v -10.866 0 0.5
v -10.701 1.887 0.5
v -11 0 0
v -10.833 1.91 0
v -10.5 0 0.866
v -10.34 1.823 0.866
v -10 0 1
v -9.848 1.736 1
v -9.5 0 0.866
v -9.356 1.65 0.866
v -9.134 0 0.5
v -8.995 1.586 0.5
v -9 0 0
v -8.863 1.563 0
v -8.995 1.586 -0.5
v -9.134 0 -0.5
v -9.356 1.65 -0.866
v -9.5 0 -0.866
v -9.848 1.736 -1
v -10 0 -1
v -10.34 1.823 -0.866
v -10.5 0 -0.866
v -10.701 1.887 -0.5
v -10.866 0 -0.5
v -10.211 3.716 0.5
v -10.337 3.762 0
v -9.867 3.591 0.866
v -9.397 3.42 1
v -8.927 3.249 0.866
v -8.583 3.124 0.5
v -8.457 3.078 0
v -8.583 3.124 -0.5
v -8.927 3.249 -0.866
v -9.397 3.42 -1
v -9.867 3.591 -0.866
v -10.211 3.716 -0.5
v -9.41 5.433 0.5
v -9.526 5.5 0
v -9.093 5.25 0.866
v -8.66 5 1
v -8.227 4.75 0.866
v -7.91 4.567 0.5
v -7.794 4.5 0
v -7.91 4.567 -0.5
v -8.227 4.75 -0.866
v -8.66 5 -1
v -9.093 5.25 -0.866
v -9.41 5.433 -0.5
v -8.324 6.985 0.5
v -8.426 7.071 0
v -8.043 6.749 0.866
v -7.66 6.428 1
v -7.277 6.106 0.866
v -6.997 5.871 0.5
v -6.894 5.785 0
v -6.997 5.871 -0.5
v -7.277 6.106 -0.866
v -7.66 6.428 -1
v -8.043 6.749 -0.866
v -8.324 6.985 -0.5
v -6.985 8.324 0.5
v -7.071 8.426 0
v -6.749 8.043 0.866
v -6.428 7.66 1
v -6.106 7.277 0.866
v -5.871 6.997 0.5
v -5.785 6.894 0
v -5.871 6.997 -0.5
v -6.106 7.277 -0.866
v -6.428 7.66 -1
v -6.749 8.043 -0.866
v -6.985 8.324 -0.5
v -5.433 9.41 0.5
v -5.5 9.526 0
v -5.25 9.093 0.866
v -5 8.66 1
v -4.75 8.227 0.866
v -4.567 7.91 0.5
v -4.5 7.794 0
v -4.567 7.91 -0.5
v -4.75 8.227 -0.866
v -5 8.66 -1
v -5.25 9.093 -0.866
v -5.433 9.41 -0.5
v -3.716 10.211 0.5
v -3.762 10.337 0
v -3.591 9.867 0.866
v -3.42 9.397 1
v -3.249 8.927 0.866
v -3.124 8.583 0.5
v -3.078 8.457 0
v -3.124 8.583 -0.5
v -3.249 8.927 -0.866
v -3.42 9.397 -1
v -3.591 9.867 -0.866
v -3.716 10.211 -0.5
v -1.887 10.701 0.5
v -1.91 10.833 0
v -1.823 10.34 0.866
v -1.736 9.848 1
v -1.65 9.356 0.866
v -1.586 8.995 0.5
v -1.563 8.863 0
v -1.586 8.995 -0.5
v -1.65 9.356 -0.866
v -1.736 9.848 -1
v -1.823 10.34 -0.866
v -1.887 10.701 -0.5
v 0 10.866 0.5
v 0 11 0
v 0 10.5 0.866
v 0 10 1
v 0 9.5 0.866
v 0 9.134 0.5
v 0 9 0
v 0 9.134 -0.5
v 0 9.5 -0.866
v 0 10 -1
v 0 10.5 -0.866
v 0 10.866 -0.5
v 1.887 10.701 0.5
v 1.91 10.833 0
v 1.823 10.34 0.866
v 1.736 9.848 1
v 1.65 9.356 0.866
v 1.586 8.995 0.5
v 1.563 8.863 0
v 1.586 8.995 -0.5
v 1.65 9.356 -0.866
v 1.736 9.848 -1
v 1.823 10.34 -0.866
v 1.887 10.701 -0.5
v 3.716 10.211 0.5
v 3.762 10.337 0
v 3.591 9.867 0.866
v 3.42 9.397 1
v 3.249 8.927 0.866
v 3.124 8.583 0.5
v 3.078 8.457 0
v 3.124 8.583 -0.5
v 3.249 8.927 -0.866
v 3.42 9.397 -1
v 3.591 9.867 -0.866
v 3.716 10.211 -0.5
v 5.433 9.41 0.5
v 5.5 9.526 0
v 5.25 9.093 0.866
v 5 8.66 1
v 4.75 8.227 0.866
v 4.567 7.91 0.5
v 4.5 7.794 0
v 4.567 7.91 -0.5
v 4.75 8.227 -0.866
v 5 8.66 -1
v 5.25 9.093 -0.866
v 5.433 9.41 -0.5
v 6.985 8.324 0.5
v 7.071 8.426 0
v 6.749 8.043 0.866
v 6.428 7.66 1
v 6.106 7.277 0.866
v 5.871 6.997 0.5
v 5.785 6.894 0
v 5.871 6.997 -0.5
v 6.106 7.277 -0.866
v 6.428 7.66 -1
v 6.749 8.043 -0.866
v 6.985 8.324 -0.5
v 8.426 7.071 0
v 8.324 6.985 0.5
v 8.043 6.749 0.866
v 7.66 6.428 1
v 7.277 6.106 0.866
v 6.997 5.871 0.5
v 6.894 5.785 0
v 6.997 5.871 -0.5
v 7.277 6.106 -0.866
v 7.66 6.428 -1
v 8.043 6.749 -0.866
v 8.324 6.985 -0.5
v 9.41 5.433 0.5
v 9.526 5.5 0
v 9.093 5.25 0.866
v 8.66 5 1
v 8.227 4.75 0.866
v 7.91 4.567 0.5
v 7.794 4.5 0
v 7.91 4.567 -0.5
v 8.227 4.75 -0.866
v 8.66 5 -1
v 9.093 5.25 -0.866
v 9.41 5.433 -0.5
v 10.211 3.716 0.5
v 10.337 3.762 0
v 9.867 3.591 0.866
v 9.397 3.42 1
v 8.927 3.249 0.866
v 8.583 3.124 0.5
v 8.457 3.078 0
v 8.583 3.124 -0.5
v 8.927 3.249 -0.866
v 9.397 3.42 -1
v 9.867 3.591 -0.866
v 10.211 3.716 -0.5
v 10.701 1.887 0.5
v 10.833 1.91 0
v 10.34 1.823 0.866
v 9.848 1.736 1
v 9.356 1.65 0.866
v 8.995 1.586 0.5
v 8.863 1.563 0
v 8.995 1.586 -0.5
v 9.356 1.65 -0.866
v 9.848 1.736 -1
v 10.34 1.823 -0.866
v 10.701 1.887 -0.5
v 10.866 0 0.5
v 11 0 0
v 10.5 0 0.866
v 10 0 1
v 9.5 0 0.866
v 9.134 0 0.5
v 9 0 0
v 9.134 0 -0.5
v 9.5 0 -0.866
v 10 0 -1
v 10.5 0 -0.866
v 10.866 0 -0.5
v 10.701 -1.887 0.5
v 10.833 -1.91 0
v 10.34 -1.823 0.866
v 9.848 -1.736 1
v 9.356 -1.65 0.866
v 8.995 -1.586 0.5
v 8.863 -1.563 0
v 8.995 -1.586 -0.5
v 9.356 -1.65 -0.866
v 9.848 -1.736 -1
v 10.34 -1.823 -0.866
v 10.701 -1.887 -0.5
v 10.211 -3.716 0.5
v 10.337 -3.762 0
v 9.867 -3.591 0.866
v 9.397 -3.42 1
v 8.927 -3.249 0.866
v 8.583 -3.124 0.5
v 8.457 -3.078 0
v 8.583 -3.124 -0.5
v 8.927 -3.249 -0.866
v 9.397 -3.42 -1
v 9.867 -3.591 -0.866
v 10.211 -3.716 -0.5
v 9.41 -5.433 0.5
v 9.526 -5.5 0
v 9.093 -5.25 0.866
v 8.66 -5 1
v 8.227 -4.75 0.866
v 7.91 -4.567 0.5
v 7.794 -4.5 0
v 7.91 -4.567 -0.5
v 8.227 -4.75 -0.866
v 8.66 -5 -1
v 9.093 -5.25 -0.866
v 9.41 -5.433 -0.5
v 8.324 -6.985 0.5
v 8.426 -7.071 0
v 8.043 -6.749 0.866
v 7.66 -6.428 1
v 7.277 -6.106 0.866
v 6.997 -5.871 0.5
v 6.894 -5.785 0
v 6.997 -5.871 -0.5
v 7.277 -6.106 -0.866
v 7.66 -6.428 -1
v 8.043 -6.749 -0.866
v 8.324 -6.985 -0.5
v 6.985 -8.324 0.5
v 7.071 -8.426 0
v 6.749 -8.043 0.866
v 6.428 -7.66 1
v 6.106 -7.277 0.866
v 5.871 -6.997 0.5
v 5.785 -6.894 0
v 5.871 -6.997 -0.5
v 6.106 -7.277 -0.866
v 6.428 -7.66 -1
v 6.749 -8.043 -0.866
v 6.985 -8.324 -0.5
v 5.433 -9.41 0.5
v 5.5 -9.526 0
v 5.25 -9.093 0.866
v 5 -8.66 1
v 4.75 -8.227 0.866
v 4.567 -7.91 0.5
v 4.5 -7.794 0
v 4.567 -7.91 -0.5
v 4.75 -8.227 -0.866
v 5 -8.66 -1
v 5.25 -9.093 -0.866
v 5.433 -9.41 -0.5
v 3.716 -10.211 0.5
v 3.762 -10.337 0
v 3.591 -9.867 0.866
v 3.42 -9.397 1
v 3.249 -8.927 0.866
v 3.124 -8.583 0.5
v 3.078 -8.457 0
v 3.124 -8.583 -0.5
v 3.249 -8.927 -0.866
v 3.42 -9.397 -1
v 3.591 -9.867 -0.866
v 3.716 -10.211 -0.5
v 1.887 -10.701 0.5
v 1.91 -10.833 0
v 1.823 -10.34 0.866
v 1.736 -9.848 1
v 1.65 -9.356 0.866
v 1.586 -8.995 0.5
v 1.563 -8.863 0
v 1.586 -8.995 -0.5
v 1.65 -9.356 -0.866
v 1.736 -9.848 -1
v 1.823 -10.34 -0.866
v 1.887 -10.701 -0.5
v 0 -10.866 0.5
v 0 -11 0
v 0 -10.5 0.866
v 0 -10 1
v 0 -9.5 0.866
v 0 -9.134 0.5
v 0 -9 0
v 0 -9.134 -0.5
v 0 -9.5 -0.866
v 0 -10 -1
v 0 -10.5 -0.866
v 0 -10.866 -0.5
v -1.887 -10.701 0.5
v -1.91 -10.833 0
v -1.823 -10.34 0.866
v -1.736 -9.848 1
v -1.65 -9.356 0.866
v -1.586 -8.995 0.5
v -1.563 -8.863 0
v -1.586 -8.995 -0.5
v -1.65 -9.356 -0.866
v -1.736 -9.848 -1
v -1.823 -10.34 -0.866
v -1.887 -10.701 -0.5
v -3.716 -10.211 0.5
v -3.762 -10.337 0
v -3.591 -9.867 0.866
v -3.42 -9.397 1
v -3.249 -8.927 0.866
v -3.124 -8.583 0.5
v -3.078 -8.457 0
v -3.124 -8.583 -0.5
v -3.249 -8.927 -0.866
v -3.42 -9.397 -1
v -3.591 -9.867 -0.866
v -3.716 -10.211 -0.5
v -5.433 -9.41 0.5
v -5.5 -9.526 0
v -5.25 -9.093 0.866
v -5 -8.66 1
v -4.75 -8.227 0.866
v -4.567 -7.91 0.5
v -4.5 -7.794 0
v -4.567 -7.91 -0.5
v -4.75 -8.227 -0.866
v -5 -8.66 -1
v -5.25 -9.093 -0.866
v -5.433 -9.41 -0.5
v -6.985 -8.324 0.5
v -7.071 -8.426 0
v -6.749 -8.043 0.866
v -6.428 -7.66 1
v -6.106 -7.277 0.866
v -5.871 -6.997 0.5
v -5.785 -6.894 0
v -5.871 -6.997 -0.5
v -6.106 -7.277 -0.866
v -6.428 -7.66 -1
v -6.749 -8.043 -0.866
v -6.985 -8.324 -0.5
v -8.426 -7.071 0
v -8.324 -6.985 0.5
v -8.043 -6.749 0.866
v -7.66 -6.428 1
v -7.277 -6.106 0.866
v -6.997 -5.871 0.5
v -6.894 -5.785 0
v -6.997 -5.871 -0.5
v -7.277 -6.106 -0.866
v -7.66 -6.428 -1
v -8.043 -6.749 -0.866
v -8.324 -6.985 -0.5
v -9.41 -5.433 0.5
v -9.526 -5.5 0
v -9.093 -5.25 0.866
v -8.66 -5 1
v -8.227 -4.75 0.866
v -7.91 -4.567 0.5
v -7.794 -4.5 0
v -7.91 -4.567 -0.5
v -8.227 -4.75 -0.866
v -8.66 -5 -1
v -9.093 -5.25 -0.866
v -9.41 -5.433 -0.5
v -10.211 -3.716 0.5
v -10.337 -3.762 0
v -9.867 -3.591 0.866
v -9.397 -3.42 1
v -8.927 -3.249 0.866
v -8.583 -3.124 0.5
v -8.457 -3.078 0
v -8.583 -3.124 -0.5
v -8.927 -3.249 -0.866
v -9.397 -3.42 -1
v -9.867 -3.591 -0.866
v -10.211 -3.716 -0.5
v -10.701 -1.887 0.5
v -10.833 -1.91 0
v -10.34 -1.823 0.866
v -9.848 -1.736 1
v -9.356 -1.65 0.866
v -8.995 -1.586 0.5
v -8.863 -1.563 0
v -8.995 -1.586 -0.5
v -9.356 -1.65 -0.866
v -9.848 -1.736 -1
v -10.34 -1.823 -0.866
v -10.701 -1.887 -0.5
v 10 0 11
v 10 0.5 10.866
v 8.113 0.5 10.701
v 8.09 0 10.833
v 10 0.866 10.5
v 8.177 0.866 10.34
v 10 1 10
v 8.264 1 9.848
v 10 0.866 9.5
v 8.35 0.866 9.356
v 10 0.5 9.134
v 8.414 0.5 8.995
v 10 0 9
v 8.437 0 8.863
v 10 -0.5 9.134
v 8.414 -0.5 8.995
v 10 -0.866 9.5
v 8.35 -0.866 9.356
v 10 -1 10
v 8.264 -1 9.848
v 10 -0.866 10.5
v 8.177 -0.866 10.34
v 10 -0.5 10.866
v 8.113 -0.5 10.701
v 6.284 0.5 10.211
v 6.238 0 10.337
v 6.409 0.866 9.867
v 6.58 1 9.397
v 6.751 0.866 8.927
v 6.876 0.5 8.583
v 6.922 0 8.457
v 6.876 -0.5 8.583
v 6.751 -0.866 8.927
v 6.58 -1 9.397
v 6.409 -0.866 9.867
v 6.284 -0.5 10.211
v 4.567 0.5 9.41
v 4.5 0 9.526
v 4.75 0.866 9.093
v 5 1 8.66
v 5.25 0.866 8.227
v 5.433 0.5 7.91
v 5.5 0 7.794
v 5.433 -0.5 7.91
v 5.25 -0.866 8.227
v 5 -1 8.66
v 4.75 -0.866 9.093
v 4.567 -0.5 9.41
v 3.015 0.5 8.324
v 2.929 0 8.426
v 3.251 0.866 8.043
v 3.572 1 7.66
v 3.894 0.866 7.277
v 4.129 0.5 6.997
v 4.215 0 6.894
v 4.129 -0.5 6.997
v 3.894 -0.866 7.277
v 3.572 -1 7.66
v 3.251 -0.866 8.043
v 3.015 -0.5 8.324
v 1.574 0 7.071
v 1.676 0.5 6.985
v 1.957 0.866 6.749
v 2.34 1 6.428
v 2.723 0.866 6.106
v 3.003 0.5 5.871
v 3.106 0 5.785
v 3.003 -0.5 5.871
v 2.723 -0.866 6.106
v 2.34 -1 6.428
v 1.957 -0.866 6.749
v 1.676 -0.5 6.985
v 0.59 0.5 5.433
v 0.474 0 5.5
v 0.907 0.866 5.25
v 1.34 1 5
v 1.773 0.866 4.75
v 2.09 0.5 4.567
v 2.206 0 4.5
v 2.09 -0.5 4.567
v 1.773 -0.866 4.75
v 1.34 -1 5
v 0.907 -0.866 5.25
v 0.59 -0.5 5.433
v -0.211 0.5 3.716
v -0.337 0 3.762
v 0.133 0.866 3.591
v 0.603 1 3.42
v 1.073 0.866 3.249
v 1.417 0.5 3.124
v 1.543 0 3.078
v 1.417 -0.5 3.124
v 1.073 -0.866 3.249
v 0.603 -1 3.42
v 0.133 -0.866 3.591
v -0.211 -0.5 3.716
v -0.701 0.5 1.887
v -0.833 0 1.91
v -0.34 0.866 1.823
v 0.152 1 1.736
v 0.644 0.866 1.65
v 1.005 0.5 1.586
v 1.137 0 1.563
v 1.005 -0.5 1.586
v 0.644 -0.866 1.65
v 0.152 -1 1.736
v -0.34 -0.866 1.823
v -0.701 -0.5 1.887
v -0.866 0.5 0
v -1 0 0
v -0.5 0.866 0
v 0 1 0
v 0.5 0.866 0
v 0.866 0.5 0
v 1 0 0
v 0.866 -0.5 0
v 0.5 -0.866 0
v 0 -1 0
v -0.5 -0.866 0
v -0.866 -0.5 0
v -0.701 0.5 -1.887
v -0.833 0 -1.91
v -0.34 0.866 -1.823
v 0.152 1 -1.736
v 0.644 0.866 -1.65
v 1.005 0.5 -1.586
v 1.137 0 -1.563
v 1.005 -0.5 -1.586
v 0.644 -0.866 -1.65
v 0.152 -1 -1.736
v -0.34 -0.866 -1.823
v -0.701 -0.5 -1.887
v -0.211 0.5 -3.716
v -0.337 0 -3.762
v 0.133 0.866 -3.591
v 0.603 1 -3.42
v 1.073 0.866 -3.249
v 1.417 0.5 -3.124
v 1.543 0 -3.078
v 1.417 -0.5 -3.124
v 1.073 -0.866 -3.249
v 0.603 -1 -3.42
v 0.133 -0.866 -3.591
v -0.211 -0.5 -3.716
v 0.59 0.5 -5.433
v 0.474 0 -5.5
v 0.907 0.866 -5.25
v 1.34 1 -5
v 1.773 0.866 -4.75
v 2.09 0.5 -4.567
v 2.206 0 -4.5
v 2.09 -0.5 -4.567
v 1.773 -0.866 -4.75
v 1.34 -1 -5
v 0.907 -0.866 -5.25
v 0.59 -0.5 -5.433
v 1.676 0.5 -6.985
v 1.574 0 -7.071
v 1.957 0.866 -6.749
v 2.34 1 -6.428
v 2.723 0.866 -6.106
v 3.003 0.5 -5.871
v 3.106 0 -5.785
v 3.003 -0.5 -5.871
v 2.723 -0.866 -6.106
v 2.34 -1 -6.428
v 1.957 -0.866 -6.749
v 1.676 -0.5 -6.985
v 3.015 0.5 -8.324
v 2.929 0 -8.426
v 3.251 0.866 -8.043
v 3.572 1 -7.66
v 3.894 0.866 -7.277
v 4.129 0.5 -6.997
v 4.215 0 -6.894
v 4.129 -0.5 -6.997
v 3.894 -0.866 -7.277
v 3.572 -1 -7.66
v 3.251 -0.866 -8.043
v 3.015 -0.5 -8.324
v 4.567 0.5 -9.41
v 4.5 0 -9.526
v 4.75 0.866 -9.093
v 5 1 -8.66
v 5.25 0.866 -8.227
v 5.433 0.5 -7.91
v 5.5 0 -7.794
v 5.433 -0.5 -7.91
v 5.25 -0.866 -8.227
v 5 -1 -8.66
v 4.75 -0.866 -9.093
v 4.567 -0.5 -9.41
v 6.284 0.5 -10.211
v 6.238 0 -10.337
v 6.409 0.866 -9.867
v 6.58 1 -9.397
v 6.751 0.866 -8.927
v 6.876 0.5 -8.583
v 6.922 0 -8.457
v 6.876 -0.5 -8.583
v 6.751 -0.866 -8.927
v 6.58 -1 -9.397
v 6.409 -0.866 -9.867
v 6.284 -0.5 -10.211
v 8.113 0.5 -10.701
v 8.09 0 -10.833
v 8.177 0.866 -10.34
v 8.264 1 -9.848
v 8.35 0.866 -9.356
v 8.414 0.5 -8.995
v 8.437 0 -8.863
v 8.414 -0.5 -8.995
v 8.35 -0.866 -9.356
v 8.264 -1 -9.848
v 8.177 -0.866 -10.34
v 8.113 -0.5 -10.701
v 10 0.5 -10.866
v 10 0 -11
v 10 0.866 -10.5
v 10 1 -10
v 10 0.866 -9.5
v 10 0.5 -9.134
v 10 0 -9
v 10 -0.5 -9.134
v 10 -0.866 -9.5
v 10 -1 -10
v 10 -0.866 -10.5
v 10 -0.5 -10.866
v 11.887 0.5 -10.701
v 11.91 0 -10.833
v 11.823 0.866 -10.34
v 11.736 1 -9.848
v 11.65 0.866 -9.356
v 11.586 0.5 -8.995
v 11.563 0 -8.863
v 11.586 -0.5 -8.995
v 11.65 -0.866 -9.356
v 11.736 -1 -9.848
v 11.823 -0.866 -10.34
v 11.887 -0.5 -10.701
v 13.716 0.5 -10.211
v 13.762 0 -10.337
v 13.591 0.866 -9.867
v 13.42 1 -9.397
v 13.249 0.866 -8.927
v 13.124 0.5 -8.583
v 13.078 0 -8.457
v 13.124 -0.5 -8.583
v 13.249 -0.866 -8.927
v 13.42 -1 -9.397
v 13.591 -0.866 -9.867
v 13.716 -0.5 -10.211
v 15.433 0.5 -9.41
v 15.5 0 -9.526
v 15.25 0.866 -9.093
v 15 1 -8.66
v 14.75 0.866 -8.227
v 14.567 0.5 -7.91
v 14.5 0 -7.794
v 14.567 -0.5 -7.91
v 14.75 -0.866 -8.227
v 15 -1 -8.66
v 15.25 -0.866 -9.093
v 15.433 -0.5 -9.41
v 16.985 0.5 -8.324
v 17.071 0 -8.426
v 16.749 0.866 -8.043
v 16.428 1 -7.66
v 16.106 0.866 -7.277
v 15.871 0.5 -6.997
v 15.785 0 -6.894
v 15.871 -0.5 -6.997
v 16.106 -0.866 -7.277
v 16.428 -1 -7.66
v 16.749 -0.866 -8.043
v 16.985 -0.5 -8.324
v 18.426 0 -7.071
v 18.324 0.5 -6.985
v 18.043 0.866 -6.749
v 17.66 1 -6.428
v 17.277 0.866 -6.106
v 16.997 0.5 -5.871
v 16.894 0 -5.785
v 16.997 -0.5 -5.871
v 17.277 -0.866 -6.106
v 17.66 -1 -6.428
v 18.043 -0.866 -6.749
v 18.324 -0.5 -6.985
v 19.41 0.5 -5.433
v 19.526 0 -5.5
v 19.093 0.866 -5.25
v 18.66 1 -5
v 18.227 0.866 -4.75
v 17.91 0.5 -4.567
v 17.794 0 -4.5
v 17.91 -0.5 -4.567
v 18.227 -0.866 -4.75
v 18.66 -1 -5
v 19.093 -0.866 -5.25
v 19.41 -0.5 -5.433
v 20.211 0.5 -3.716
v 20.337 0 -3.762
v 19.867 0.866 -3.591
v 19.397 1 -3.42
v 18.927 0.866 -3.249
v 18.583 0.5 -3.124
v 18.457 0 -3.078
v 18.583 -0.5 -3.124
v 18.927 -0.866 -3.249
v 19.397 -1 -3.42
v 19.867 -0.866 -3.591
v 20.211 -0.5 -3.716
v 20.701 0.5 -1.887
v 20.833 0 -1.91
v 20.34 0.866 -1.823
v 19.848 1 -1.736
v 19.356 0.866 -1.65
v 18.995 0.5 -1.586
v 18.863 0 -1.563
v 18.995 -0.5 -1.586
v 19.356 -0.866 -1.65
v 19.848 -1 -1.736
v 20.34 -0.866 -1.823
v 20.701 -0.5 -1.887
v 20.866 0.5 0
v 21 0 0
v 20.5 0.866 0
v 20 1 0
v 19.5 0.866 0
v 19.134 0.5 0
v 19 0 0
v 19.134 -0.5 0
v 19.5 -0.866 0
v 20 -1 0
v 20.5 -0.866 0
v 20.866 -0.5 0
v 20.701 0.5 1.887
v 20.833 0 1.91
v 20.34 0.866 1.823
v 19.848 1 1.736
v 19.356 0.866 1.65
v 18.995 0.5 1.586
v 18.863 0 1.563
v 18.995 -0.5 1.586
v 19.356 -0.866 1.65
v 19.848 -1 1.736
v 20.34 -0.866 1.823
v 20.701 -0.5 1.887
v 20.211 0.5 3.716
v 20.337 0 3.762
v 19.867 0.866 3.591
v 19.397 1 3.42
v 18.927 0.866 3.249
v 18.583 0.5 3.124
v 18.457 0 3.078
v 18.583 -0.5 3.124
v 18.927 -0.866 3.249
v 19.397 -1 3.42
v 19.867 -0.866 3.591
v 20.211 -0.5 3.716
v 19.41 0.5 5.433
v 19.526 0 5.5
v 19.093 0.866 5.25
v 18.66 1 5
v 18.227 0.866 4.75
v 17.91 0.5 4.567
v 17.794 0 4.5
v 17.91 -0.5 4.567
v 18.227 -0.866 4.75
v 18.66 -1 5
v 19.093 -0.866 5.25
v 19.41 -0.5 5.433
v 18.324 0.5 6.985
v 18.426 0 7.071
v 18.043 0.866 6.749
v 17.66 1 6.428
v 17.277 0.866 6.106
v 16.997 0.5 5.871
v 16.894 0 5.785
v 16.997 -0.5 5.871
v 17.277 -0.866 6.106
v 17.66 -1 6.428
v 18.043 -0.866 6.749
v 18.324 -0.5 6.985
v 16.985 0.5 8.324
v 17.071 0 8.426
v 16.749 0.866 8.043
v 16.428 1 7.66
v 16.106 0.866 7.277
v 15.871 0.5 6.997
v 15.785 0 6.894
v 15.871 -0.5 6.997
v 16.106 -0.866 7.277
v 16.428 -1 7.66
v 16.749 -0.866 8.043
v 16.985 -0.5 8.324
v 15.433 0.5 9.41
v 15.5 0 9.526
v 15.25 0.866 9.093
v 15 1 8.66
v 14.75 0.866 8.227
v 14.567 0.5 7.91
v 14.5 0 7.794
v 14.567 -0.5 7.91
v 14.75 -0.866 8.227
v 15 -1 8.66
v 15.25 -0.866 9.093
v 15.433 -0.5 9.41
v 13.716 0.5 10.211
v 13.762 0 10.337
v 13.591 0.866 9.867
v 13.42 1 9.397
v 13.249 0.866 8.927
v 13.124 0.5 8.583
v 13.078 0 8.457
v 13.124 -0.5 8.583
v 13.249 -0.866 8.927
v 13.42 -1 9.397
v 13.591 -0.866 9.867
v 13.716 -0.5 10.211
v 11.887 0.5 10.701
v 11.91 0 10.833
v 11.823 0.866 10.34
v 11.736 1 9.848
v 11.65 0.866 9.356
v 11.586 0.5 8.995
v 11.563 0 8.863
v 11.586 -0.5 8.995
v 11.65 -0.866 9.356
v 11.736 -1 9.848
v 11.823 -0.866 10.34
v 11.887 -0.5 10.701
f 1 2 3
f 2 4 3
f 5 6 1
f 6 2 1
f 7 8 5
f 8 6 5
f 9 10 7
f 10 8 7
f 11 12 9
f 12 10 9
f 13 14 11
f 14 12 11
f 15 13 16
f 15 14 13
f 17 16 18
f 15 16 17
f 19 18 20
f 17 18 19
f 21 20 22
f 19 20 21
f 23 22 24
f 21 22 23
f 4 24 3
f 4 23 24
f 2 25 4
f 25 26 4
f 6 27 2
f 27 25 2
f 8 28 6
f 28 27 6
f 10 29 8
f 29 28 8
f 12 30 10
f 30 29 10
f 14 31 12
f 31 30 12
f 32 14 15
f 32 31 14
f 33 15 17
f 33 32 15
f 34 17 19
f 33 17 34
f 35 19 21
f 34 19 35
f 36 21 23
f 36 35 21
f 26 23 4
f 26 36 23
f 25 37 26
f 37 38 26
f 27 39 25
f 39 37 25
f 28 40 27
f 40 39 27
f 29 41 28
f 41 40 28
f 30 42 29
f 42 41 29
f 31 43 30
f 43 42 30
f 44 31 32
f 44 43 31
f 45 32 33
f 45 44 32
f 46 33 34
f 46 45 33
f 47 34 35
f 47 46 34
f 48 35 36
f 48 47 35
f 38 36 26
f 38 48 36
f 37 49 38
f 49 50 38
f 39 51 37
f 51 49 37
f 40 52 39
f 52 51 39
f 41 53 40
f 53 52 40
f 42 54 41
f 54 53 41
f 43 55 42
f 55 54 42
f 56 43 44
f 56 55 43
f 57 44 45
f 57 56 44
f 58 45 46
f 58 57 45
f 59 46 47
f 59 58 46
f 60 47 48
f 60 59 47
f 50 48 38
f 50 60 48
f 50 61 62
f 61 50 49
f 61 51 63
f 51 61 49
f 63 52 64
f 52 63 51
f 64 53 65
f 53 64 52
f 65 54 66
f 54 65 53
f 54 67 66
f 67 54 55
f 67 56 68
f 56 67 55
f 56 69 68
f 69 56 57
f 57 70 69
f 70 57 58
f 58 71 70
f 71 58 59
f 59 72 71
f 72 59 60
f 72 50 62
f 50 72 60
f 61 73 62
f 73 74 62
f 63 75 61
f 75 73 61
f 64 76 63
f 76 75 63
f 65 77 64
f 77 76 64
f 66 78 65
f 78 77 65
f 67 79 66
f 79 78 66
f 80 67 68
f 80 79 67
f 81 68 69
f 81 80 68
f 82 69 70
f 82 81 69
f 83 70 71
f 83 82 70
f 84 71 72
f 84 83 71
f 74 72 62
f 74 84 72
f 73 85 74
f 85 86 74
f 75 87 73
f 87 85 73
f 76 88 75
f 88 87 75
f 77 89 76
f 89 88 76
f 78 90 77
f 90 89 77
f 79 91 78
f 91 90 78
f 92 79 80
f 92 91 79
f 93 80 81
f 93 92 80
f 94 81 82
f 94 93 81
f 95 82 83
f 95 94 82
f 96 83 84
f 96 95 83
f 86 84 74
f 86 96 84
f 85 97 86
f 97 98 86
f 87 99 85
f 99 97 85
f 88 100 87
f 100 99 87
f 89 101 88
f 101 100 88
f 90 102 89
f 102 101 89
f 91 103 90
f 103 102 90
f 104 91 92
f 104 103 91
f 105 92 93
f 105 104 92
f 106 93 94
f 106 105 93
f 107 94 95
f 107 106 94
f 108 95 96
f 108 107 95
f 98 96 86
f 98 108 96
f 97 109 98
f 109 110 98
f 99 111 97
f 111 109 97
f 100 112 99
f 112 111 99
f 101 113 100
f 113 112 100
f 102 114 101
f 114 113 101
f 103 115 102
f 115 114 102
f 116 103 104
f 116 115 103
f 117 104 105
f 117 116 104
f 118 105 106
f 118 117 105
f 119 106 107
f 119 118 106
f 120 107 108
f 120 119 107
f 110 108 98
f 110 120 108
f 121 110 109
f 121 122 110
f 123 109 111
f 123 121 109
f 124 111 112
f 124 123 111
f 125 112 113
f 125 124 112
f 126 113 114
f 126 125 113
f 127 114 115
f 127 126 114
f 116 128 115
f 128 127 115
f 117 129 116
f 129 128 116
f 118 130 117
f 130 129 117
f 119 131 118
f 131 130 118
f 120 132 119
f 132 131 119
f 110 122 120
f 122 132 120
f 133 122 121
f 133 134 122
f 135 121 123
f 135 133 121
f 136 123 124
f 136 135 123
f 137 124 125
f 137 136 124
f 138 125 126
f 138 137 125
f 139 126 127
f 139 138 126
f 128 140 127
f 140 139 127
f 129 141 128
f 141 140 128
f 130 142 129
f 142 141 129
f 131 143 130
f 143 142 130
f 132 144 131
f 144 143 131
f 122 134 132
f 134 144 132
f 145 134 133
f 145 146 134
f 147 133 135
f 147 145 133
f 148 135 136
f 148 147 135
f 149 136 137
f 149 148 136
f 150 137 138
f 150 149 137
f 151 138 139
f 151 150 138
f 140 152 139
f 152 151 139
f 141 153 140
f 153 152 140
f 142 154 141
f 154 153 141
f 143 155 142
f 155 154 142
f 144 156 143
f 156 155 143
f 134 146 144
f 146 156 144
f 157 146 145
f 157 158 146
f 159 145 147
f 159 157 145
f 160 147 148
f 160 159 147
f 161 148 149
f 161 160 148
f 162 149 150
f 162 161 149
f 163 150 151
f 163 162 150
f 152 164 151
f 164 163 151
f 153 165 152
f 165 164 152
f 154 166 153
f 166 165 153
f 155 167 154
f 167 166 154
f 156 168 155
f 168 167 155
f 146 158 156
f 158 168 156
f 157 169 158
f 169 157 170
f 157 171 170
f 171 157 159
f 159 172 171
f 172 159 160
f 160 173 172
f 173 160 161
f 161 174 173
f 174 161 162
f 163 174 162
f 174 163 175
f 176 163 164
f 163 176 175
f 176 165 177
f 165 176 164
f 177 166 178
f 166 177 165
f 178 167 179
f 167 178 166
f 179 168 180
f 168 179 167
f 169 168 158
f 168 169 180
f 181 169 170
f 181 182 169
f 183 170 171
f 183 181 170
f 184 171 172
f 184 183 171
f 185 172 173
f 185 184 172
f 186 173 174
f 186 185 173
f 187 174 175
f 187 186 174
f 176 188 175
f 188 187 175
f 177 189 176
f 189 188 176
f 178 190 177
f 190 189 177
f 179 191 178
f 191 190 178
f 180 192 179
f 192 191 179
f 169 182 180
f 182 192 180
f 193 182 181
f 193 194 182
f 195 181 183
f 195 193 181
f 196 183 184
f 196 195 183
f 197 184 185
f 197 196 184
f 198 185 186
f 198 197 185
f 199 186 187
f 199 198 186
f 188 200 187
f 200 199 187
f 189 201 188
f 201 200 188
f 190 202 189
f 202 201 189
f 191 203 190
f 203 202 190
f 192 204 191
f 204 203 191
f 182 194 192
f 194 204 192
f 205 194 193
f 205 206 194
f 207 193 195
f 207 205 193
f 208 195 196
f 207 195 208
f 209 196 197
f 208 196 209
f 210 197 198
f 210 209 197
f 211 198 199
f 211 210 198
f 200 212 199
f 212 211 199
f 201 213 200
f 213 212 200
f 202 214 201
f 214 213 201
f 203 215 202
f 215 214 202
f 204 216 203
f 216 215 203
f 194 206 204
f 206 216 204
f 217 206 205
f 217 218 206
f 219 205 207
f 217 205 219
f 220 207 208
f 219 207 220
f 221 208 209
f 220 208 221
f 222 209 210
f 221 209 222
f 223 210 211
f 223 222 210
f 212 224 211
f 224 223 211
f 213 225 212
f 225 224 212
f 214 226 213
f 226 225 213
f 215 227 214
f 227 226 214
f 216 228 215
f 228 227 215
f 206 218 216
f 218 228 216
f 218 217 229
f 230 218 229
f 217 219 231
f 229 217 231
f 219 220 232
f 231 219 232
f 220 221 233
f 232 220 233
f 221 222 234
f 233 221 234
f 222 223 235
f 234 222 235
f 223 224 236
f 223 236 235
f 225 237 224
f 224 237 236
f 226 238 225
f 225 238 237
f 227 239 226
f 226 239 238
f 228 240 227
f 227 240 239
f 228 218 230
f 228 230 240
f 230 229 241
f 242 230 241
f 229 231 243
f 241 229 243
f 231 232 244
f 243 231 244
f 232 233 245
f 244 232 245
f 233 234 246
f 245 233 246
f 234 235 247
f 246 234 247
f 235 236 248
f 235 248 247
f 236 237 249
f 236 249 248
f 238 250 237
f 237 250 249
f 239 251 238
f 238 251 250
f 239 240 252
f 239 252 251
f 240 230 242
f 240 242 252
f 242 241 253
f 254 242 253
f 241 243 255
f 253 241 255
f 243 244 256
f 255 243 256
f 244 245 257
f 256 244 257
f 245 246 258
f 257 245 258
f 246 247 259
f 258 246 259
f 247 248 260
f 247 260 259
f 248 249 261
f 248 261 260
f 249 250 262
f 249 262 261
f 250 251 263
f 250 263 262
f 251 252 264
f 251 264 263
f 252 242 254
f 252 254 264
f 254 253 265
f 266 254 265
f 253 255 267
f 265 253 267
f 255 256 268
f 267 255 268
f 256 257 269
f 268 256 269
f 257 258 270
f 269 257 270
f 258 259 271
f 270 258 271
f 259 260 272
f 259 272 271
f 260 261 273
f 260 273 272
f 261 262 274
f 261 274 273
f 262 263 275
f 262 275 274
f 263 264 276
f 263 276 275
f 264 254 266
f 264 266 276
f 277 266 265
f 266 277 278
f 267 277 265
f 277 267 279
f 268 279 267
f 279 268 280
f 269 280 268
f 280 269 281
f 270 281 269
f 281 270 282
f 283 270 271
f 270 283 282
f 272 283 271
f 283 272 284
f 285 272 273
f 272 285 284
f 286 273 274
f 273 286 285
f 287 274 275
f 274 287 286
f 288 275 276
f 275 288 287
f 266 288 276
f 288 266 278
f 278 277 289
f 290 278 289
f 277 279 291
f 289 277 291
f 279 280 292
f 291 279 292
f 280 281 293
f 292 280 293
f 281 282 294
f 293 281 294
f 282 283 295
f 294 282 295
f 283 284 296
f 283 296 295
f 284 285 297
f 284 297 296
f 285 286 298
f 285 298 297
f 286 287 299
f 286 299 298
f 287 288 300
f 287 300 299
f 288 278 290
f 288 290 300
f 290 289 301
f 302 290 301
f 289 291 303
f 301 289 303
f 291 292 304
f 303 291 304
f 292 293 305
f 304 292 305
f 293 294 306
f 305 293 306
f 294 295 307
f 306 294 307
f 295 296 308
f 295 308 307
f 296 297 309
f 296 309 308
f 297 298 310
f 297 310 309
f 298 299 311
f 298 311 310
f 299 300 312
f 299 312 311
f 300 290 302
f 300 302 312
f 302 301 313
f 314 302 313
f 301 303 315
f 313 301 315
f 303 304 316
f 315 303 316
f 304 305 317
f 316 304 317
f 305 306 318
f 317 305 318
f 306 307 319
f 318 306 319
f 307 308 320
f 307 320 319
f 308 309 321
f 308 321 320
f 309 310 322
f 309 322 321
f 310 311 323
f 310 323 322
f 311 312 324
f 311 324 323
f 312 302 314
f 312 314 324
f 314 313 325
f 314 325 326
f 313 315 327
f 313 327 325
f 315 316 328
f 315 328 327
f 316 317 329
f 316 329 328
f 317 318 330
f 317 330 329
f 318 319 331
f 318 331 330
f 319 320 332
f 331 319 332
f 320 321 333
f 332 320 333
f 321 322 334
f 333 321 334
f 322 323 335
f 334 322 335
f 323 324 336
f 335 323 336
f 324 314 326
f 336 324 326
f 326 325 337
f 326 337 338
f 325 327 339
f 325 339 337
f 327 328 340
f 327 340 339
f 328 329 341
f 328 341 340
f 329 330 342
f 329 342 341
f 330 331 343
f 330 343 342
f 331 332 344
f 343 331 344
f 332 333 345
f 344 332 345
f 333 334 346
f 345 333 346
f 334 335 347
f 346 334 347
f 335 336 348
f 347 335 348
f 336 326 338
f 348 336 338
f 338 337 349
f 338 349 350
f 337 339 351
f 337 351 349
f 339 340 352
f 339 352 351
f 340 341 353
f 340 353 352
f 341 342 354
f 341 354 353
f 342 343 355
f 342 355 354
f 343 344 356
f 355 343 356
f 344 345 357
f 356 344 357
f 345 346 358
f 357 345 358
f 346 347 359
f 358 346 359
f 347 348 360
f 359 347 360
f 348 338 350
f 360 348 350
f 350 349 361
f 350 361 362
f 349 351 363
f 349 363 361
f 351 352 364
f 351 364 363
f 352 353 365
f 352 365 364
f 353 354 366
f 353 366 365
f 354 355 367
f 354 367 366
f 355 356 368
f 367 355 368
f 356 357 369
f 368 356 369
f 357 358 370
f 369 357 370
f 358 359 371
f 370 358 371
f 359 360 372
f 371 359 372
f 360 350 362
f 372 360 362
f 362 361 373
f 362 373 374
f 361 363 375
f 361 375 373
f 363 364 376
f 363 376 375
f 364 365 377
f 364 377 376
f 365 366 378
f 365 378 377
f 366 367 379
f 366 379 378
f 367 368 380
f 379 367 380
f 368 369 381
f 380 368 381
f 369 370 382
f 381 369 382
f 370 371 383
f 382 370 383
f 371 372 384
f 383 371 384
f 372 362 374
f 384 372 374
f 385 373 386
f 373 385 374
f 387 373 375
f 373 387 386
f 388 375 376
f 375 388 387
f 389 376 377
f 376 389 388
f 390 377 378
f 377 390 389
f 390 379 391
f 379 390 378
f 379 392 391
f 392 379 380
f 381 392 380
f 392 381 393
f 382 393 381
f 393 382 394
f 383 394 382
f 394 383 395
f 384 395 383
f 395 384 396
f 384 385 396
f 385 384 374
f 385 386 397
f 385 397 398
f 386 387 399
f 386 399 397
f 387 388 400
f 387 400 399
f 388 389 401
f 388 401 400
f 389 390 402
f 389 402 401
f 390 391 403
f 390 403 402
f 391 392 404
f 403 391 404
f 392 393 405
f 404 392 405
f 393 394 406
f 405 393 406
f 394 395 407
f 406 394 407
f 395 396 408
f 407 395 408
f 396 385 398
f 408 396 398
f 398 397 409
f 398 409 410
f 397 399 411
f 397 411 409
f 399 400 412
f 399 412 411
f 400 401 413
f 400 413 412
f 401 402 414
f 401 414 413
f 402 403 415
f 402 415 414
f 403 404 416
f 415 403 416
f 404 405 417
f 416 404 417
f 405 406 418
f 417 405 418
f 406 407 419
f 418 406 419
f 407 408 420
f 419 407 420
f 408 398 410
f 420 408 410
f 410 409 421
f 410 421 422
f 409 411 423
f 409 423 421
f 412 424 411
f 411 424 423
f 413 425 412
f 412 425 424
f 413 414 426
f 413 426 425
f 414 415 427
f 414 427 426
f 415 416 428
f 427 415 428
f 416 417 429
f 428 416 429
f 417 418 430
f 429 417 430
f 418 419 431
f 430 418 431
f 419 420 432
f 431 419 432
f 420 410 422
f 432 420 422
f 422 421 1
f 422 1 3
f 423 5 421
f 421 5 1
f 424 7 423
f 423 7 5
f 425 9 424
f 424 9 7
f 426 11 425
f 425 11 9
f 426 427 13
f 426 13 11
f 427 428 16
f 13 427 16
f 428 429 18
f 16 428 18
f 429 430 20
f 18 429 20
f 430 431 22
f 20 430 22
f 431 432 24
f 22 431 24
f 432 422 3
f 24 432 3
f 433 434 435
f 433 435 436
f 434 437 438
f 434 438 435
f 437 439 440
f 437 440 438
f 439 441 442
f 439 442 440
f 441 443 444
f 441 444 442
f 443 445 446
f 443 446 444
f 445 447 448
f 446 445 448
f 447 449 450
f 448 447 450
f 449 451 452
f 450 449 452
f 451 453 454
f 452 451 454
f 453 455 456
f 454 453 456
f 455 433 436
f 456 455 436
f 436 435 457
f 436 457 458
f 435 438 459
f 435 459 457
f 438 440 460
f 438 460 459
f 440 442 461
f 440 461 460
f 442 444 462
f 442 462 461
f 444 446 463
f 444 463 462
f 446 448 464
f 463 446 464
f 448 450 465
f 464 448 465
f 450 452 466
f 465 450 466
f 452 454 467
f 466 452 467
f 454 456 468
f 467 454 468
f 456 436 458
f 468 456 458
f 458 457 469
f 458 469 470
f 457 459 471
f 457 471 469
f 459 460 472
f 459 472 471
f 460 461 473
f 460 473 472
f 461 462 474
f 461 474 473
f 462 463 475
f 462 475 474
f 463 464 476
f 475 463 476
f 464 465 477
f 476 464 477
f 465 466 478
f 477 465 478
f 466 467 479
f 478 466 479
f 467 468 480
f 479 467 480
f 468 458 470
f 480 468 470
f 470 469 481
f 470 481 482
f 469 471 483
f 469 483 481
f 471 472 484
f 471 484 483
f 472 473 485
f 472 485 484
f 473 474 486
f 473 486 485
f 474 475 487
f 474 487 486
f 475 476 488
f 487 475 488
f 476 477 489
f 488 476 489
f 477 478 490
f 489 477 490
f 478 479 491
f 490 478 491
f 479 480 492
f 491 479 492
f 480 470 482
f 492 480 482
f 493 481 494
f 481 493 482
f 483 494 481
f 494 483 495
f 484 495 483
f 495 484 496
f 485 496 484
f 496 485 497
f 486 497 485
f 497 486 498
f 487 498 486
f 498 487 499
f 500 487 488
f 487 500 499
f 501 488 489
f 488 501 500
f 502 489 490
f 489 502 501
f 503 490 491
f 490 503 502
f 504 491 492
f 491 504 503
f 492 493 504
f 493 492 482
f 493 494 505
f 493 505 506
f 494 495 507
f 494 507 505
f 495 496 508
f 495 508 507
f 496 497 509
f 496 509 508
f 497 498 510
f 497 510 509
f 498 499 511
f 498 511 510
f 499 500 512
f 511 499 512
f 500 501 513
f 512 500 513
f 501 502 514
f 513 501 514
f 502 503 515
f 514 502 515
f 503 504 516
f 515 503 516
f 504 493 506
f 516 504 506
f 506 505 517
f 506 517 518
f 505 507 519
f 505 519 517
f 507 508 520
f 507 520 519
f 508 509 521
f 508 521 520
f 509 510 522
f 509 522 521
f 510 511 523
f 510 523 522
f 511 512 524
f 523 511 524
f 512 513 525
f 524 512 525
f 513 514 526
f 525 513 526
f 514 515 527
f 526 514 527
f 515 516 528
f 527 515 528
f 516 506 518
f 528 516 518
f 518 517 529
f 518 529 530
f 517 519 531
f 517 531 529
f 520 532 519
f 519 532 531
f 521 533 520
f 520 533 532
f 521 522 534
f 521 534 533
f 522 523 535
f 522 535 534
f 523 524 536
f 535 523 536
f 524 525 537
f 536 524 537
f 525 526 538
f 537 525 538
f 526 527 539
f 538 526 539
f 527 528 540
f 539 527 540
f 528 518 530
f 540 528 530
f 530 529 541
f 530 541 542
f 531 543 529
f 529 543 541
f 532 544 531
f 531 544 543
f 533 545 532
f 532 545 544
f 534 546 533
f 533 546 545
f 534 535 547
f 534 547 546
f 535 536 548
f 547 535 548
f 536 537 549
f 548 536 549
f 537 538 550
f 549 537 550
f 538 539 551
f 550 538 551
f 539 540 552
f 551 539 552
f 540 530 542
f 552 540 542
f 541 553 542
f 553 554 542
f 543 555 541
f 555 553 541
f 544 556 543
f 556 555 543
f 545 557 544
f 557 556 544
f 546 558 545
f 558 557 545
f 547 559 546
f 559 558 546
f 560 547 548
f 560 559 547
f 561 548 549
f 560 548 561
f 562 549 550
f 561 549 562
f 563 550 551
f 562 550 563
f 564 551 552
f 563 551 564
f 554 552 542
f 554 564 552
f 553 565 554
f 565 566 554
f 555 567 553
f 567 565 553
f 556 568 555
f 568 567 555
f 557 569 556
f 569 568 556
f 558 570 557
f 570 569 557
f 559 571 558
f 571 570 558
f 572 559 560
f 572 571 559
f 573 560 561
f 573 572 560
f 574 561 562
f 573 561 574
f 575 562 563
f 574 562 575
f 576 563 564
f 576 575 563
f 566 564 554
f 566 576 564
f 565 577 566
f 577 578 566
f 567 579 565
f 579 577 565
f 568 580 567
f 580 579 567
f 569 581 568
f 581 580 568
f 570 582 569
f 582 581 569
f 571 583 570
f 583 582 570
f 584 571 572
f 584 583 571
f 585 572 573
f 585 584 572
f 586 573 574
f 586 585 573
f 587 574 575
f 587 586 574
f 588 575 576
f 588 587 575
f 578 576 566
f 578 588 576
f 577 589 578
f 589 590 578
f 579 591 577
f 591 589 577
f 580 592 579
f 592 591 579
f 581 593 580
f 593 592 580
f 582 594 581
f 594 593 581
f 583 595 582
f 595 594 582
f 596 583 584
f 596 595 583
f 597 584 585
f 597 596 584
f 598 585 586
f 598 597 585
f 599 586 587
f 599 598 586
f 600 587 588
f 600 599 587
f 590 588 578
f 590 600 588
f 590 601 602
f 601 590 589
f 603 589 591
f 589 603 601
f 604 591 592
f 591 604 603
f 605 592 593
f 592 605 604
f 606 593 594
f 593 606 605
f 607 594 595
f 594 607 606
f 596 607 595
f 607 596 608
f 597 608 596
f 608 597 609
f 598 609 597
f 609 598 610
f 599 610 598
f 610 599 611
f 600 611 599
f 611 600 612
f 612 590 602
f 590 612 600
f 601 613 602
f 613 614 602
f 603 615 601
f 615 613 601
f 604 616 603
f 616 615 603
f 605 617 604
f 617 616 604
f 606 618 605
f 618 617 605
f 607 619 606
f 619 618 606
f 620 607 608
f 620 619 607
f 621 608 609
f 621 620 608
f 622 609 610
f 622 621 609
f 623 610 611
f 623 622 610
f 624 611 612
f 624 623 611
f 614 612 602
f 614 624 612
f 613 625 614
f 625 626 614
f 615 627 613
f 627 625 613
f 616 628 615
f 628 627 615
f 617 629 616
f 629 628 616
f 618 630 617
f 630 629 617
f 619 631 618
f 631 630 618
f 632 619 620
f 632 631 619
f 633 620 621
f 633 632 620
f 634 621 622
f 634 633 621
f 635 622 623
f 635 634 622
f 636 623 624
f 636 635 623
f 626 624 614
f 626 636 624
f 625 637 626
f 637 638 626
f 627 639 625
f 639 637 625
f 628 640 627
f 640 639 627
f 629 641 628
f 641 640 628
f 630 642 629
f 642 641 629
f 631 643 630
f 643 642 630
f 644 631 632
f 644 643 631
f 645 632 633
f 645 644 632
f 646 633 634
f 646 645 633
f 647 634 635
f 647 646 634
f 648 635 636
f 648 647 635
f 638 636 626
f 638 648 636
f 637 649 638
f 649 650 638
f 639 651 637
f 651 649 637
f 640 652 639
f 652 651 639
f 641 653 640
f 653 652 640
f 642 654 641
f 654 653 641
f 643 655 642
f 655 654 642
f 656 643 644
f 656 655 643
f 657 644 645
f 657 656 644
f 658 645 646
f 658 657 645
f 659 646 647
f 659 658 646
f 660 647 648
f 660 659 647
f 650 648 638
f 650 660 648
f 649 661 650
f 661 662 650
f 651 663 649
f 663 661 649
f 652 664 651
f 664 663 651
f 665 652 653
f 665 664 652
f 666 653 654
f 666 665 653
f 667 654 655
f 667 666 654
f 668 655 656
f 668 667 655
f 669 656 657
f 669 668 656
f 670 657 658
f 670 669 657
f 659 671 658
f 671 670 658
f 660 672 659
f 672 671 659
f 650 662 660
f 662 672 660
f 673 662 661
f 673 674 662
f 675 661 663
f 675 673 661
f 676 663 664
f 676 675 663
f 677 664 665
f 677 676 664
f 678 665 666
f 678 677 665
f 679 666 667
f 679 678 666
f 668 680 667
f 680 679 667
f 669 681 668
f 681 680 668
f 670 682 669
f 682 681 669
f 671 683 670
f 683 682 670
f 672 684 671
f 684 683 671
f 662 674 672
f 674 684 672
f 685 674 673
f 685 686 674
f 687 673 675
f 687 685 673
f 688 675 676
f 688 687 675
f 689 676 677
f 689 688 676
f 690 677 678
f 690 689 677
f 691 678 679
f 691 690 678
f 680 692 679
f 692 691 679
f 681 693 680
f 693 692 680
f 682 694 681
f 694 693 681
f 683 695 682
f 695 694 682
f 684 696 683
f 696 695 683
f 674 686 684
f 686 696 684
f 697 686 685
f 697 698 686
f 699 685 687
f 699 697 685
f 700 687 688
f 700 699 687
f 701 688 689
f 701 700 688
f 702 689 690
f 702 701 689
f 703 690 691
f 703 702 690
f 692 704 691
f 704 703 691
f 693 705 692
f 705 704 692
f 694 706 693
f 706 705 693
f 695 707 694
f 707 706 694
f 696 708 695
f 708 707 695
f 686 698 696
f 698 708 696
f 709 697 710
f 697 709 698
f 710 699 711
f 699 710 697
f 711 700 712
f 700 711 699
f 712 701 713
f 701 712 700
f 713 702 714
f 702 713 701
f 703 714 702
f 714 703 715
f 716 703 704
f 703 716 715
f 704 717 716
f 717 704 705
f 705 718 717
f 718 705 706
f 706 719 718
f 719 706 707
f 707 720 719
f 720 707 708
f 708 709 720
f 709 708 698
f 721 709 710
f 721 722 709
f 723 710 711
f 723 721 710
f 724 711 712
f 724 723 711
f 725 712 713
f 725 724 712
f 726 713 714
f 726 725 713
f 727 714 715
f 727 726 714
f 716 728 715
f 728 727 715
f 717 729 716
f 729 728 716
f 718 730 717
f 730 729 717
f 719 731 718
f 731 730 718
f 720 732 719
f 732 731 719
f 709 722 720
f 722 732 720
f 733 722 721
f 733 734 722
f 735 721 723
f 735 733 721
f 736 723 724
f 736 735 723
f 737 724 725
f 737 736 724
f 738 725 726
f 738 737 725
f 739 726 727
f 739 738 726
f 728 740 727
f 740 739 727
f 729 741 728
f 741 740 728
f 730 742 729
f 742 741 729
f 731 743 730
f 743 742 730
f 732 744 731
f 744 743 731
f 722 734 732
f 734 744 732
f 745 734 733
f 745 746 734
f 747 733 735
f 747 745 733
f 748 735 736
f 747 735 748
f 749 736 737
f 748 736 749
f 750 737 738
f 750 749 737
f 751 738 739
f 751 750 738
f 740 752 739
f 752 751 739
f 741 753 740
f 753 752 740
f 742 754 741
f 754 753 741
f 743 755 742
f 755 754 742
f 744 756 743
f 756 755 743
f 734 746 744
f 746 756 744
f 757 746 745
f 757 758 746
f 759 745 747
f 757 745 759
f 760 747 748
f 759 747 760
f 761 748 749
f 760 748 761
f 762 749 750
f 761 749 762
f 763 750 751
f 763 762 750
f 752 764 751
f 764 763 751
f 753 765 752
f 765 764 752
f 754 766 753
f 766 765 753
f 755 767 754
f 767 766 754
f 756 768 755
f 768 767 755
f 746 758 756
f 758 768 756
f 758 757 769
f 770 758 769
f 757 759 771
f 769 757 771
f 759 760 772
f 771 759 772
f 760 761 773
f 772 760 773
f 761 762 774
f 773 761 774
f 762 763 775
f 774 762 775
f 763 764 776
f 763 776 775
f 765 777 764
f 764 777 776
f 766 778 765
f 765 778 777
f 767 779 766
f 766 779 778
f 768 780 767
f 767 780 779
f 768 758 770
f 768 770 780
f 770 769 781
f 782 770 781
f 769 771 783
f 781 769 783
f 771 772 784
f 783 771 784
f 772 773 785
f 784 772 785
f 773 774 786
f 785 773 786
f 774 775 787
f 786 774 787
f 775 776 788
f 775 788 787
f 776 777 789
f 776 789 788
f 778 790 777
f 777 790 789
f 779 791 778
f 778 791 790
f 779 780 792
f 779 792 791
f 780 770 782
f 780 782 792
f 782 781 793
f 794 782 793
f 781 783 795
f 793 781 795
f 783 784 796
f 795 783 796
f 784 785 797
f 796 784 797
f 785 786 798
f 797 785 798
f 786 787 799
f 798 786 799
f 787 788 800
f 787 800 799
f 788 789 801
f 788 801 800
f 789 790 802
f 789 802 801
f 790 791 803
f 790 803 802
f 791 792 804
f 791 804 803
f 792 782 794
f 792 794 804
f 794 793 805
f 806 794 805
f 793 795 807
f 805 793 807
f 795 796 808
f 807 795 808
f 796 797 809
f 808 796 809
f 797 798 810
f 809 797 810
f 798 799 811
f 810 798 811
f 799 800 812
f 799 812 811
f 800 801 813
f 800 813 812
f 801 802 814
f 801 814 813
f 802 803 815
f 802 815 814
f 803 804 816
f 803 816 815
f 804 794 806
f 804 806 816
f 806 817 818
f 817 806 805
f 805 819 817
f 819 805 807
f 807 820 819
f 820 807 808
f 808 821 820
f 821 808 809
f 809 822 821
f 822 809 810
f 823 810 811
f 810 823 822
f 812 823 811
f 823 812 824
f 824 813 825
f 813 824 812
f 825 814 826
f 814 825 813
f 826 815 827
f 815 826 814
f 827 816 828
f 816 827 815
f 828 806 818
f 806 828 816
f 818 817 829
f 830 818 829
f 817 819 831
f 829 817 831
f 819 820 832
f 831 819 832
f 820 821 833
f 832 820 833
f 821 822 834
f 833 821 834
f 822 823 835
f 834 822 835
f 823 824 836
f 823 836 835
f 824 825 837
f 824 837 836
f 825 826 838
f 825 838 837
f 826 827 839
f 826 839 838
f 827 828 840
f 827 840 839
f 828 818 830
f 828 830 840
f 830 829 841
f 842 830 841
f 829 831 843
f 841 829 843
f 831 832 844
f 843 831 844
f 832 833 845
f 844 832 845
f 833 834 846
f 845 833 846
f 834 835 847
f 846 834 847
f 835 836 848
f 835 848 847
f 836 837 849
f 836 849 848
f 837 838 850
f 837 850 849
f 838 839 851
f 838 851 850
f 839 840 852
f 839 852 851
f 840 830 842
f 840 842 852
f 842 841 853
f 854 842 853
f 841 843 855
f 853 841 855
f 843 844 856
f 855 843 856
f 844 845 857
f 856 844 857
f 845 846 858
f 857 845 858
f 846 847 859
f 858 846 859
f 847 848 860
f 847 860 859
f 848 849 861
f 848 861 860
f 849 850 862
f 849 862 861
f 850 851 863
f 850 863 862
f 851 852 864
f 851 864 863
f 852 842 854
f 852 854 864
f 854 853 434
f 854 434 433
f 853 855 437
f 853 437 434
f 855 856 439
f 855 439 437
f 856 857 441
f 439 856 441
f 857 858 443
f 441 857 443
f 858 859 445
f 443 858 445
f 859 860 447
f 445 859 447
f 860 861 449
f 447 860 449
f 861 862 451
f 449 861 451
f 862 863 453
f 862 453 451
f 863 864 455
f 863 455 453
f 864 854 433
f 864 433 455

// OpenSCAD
// file: geometry.scad
function distance(p1, p2) = sqrt(pow(p2[0]-p1[0], 2) + pow(p2[1]-p1[1], 2) + pow(p2[2]-p1[2], 2));
// main file
use <geometry.scad>

module basic_torus(radius, thickness, $fa=30, $fs=0.5, $fn1=36, $fn2=12){
    rotate_extrude(convexity = 10, $fn = $fn1)
    translate([radius, 0, 0])
    circle(r = thickness, $fn=$fn2);
}

module torus(center, normal, radius, thickness, $fa=30, $fs=0.5, $fn1=36, $fn2=12){
    normal_length = sqrt(pow(normal[0], 2) + pow(normal[1], 2) + pow(normal[2], 2));
    b = acos(normal[2]/normal_length);
    c = (normal[0]==0) ? sign(normal[1])*90 : ((normal[0]>0) ? atan(normal[1]/normal[0]) : atan(normal[1]/normal[0])+180);
    translate(center) rotate([0, b, c]) basic_torus(radius, thickness, $fa, $fs, $fn1, $fn2);
}

module torus_through_point(center, p, normal_rotation, thickness, $fa=30, $fs=0.5, $fn1=36, $fn2=12){
    radius = distance(center, p);
    z = 0;
    x = 1;
    y = -x*(center[0]-p[0])/(center[1]-p[1]);
    torus(center, [x,y,z], radius, thickness, $fa, $fs, $fn1, $fn2);
}

//============ Usage ============//

torus([0, 0, 0], [0, 0, 1], 10, 1);
torus([10, 0, 0], [0, 1, 0], 10, 1);
